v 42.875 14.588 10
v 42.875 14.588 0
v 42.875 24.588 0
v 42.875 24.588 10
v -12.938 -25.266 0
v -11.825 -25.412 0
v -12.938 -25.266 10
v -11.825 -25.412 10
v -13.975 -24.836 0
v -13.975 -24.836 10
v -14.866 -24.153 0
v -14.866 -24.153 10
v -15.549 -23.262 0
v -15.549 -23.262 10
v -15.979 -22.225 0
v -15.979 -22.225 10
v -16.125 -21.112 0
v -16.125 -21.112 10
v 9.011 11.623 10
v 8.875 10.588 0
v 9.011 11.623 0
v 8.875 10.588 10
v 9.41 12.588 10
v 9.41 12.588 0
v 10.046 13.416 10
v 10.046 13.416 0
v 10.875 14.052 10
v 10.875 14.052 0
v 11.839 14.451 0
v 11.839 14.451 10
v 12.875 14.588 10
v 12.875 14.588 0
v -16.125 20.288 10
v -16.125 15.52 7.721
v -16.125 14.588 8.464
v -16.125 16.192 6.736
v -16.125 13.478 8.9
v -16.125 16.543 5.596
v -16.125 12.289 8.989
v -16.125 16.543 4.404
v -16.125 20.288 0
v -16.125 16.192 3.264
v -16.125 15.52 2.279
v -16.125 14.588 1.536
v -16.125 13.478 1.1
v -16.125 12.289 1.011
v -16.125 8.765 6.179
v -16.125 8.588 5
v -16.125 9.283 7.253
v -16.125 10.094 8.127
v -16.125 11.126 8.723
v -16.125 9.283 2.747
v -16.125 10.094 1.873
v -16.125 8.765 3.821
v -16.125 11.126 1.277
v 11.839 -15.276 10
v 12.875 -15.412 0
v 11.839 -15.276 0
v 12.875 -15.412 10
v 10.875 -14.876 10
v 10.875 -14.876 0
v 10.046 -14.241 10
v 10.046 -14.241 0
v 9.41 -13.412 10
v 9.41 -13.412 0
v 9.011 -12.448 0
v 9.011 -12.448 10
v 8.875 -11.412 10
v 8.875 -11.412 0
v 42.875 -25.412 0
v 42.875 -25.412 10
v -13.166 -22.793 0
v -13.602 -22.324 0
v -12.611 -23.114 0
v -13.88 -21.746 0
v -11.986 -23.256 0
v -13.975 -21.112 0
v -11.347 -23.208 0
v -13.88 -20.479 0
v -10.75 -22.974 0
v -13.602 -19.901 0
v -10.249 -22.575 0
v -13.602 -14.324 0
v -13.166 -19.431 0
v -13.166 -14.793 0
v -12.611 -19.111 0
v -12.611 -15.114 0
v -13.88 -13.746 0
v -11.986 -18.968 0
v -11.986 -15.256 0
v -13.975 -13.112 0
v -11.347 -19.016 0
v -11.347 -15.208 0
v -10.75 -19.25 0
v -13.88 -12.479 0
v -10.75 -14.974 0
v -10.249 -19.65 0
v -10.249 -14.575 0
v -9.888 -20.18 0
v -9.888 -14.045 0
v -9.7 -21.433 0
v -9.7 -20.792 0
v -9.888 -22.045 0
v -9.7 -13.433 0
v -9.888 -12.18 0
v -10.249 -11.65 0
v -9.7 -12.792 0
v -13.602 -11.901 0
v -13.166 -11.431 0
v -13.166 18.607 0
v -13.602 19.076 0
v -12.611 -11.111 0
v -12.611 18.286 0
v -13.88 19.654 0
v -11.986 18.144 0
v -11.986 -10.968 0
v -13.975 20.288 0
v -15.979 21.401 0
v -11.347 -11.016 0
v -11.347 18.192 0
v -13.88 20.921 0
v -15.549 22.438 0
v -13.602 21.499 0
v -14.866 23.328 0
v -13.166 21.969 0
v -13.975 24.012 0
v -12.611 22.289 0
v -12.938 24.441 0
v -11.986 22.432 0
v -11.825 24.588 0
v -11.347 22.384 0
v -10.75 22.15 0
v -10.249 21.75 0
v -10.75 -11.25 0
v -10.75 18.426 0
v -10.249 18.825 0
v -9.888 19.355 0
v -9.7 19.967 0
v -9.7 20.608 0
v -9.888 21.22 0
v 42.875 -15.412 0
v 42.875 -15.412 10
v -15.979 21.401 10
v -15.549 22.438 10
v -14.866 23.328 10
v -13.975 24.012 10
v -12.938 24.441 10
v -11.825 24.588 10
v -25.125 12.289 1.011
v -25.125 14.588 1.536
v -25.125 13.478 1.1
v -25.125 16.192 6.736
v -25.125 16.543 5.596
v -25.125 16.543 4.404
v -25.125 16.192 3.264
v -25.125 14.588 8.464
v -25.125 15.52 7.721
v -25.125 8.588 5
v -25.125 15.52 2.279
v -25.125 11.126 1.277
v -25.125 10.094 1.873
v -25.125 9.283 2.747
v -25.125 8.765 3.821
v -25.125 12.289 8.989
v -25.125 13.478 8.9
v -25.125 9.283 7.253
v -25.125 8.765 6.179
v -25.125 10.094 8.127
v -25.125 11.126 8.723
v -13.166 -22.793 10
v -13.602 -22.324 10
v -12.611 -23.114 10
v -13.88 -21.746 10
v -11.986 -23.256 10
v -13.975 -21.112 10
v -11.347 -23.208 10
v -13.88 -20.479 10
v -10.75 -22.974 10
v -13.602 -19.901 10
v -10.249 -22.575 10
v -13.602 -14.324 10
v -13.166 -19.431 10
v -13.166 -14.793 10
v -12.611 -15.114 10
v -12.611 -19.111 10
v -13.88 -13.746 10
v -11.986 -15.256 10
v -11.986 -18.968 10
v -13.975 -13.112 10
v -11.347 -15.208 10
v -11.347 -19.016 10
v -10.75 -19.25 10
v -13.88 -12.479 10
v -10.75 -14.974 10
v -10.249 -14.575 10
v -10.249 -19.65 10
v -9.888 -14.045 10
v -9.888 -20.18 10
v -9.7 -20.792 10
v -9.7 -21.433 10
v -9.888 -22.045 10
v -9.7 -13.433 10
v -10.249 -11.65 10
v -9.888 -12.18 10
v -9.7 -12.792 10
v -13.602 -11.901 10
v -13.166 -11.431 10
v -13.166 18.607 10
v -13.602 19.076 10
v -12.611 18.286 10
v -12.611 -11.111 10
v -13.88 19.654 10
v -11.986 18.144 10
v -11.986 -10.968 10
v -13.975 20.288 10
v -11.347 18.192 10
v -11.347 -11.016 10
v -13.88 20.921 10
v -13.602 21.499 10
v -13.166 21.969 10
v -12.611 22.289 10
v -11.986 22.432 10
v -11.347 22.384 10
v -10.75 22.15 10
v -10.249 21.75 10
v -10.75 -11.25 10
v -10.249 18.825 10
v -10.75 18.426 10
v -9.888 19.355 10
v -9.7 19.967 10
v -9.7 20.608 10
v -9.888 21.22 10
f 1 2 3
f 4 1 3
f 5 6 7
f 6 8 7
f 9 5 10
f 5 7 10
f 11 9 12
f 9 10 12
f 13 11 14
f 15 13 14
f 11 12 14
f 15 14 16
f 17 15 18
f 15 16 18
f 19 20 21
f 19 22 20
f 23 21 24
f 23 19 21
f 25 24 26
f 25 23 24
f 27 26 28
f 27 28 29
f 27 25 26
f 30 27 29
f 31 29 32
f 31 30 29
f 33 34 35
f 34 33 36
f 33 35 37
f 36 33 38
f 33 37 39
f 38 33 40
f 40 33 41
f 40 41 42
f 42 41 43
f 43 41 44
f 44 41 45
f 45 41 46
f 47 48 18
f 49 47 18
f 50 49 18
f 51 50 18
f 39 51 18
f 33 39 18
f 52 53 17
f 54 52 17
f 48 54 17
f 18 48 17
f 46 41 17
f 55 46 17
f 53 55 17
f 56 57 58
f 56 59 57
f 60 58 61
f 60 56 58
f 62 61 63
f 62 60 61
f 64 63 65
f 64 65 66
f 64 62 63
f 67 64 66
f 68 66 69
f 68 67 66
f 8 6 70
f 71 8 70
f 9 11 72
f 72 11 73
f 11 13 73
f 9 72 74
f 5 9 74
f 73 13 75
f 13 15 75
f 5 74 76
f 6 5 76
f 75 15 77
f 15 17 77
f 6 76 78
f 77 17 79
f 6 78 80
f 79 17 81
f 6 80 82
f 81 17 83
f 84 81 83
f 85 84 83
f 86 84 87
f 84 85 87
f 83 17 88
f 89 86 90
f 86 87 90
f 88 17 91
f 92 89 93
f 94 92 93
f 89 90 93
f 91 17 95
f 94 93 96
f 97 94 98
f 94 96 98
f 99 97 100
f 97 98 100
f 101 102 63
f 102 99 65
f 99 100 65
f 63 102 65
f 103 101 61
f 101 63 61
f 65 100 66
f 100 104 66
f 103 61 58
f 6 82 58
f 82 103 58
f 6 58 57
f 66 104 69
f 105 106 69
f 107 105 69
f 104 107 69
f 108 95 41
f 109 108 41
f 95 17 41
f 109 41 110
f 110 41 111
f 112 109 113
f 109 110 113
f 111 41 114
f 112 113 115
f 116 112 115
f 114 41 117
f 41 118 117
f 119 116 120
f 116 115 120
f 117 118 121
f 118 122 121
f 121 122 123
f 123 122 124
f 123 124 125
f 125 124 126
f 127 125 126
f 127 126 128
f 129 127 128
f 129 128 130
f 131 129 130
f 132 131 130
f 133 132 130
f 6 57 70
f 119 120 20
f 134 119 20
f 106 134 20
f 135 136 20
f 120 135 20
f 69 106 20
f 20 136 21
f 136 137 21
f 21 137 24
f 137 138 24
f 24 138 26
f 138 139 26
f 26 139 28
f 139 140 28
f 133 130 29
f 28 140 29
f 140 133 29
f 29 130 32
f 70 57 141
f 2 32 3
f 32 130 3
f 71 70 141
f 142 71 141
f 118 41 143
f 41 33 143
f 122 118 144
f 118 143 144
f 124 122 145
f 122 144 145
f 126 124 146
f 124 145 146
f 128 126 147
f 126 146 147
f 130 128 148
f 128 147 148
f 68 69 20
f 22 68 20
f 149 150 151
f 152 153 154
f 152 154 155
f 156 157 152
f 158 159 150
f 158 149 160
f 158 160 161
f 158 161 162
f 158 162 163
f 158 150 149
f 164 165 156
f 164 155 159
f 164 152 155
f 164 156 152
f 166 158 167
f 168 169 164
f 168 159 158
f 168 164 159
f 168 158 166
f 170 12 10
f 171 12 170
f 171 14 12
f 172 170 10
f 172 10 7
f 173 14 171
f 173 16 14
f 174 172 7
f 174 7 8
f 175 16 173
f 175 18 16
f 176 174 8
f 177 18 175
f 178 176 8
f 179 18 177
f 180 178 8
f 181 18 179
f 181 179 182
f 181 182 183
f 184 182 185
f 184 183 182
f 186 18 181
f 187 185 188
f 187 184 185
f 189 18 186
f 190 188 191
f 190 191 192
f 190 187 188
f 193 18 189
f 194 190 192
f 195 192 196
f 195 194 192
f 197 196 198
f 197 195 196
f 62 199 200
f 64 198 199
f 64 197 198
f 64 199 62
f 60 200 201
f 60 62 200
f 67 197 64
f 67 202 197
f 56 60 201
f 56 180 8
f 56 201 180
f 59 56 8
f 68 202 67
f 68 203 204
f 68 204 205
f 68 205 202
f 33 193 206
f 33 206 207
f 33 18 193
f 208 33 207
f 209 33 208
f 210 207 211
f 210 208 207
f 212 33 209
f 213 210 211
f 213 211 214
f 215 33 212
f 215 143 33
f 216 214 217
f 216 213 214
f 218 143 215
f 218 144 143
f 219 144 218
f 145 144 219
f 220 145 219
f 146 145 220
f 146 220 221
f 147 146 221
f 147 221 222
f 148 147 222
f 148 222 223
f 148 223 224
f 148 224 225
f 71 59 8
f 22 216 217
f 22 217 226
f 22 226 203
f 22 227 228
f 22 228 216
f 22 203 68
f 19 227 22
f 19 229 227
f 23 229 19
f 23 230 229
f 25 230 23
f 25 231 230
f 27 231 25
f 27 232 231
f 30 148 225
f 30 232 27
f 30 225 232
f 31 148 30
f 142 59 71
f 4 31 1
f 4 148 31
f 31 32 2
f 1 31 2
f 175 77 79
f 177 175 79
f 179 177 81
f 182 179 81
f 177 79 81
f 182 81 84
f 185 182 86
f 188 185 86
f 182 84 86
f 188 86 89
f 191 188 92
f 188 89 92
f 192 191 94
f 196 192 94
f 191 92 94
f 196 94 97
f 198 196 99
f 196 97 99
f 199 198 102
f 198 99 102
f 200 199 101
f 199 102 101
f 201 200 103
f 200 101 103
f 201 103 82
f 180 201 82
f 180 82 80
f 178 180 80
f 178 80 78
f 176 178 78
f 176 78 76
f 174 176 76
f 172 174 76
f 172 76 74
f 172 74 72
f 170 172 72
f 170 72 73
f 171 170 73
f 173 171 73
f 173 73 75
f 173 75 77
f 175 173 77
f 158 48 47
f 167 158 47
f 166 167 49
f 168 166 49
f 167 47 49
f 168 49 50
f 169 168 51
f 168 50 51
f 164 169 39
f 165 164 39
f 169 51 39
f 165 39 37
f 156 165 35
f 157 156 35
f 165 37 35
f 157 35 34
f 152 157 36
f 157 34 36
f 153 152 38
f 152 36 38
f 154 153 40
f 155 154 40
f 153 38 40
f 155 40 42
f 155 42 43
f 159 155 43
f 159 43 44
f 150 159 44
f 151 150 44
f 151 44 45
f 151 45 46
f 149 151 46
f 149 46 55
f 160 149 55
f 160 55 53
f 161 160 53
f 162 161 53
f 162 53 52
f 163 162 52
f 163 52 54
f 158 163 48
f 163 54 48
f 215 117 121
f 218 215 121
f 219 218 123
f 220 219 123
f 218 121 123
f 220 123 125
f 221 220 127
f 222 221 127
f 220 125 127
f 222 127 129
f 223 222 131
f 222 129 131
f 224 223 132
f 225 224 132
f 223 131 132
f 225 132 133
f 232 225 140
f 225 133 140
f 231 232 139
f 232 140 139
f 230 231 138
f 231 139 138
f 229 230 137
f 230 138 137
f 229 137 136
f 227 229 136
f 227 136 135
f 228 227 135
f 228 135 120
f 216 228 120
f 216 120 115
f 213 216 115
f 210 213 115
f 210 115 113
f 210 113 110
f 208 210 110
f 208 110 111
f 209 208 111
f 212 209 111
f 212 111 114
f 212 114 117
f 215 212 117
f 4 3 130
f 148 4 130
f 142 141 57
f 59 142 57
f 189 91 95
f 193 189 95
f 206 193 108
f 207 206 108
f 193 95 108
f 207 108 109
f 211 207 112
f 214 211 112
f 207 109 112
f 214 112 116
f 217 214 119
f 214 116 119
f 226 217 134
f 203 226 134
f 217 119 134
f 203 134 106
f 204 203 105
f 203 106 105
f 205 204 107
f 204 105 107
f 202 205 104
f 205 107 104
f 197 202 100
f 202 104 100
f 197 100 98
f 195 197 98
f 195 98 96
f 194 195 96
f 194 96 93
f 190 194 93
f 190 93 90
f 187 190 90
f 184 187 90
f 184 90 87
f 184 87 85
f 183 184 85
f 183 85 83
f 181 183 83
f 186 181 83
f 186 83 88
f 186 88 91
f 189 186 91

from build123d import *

# Parameters (mm, degrees)
F1_DEPTH = 10
F2_R     = 4
F3_R     = 4.3
F5_D     = 4.3
F6_R     = 4
F7_DEPTH = 9


with BuildPart() as f1:
    # F0 (on Top) → F1 (new body)
    with BuildSketch(Plane.XY):
        Polygon((42.874504, 24.587632), (-16.125496, 24.587632), (-16.125496, -25.412368), (42.874504, -25.412368), (42.874504, -15.412368), (8.874504, -15.412368), (8.874504, 14.587632), (42.874504, 14.587632), align=None)
    extrude(amount=F1_DEPTH)

    # F2
    f2_edges = [f1.edges().sort_by_distance(p)[0] for p in [
        (8.874504, 14.587632, 5),
        (8.874504, -15.412368, 5),
    ]]
    fillet(f2_edges, radius=F2_R)

    # F3
    f3_edges = [f1.edges().sort_by_distance(p)[0] for p in [
        (-16.125496, 24.587632, 5),
        (-16.125496, -25.412368, 5),
    ]]
    fillet(f3_edges, radius=F3_R)

    # F5 (through all)
    with Locations(Plane.XY.offset(10)):
        with Locations((-11.825496, 20.287632), (-11.825496, -13.112368), (-11.825496, -21.112368)):
            Hole(F5_D / 2)

    # F6 (on face) → F7 (join)
    with BuildSketch(Plane(origin=(-16.125496, 0, 0), x_dir=(0, -1, 0), z_dir=(-1, 0, 0))):
        with Locations((-12.587632, 5)):
            Circle(F6_R)
    extrude(amount=F7_DEPTH)


solid = f1.part
